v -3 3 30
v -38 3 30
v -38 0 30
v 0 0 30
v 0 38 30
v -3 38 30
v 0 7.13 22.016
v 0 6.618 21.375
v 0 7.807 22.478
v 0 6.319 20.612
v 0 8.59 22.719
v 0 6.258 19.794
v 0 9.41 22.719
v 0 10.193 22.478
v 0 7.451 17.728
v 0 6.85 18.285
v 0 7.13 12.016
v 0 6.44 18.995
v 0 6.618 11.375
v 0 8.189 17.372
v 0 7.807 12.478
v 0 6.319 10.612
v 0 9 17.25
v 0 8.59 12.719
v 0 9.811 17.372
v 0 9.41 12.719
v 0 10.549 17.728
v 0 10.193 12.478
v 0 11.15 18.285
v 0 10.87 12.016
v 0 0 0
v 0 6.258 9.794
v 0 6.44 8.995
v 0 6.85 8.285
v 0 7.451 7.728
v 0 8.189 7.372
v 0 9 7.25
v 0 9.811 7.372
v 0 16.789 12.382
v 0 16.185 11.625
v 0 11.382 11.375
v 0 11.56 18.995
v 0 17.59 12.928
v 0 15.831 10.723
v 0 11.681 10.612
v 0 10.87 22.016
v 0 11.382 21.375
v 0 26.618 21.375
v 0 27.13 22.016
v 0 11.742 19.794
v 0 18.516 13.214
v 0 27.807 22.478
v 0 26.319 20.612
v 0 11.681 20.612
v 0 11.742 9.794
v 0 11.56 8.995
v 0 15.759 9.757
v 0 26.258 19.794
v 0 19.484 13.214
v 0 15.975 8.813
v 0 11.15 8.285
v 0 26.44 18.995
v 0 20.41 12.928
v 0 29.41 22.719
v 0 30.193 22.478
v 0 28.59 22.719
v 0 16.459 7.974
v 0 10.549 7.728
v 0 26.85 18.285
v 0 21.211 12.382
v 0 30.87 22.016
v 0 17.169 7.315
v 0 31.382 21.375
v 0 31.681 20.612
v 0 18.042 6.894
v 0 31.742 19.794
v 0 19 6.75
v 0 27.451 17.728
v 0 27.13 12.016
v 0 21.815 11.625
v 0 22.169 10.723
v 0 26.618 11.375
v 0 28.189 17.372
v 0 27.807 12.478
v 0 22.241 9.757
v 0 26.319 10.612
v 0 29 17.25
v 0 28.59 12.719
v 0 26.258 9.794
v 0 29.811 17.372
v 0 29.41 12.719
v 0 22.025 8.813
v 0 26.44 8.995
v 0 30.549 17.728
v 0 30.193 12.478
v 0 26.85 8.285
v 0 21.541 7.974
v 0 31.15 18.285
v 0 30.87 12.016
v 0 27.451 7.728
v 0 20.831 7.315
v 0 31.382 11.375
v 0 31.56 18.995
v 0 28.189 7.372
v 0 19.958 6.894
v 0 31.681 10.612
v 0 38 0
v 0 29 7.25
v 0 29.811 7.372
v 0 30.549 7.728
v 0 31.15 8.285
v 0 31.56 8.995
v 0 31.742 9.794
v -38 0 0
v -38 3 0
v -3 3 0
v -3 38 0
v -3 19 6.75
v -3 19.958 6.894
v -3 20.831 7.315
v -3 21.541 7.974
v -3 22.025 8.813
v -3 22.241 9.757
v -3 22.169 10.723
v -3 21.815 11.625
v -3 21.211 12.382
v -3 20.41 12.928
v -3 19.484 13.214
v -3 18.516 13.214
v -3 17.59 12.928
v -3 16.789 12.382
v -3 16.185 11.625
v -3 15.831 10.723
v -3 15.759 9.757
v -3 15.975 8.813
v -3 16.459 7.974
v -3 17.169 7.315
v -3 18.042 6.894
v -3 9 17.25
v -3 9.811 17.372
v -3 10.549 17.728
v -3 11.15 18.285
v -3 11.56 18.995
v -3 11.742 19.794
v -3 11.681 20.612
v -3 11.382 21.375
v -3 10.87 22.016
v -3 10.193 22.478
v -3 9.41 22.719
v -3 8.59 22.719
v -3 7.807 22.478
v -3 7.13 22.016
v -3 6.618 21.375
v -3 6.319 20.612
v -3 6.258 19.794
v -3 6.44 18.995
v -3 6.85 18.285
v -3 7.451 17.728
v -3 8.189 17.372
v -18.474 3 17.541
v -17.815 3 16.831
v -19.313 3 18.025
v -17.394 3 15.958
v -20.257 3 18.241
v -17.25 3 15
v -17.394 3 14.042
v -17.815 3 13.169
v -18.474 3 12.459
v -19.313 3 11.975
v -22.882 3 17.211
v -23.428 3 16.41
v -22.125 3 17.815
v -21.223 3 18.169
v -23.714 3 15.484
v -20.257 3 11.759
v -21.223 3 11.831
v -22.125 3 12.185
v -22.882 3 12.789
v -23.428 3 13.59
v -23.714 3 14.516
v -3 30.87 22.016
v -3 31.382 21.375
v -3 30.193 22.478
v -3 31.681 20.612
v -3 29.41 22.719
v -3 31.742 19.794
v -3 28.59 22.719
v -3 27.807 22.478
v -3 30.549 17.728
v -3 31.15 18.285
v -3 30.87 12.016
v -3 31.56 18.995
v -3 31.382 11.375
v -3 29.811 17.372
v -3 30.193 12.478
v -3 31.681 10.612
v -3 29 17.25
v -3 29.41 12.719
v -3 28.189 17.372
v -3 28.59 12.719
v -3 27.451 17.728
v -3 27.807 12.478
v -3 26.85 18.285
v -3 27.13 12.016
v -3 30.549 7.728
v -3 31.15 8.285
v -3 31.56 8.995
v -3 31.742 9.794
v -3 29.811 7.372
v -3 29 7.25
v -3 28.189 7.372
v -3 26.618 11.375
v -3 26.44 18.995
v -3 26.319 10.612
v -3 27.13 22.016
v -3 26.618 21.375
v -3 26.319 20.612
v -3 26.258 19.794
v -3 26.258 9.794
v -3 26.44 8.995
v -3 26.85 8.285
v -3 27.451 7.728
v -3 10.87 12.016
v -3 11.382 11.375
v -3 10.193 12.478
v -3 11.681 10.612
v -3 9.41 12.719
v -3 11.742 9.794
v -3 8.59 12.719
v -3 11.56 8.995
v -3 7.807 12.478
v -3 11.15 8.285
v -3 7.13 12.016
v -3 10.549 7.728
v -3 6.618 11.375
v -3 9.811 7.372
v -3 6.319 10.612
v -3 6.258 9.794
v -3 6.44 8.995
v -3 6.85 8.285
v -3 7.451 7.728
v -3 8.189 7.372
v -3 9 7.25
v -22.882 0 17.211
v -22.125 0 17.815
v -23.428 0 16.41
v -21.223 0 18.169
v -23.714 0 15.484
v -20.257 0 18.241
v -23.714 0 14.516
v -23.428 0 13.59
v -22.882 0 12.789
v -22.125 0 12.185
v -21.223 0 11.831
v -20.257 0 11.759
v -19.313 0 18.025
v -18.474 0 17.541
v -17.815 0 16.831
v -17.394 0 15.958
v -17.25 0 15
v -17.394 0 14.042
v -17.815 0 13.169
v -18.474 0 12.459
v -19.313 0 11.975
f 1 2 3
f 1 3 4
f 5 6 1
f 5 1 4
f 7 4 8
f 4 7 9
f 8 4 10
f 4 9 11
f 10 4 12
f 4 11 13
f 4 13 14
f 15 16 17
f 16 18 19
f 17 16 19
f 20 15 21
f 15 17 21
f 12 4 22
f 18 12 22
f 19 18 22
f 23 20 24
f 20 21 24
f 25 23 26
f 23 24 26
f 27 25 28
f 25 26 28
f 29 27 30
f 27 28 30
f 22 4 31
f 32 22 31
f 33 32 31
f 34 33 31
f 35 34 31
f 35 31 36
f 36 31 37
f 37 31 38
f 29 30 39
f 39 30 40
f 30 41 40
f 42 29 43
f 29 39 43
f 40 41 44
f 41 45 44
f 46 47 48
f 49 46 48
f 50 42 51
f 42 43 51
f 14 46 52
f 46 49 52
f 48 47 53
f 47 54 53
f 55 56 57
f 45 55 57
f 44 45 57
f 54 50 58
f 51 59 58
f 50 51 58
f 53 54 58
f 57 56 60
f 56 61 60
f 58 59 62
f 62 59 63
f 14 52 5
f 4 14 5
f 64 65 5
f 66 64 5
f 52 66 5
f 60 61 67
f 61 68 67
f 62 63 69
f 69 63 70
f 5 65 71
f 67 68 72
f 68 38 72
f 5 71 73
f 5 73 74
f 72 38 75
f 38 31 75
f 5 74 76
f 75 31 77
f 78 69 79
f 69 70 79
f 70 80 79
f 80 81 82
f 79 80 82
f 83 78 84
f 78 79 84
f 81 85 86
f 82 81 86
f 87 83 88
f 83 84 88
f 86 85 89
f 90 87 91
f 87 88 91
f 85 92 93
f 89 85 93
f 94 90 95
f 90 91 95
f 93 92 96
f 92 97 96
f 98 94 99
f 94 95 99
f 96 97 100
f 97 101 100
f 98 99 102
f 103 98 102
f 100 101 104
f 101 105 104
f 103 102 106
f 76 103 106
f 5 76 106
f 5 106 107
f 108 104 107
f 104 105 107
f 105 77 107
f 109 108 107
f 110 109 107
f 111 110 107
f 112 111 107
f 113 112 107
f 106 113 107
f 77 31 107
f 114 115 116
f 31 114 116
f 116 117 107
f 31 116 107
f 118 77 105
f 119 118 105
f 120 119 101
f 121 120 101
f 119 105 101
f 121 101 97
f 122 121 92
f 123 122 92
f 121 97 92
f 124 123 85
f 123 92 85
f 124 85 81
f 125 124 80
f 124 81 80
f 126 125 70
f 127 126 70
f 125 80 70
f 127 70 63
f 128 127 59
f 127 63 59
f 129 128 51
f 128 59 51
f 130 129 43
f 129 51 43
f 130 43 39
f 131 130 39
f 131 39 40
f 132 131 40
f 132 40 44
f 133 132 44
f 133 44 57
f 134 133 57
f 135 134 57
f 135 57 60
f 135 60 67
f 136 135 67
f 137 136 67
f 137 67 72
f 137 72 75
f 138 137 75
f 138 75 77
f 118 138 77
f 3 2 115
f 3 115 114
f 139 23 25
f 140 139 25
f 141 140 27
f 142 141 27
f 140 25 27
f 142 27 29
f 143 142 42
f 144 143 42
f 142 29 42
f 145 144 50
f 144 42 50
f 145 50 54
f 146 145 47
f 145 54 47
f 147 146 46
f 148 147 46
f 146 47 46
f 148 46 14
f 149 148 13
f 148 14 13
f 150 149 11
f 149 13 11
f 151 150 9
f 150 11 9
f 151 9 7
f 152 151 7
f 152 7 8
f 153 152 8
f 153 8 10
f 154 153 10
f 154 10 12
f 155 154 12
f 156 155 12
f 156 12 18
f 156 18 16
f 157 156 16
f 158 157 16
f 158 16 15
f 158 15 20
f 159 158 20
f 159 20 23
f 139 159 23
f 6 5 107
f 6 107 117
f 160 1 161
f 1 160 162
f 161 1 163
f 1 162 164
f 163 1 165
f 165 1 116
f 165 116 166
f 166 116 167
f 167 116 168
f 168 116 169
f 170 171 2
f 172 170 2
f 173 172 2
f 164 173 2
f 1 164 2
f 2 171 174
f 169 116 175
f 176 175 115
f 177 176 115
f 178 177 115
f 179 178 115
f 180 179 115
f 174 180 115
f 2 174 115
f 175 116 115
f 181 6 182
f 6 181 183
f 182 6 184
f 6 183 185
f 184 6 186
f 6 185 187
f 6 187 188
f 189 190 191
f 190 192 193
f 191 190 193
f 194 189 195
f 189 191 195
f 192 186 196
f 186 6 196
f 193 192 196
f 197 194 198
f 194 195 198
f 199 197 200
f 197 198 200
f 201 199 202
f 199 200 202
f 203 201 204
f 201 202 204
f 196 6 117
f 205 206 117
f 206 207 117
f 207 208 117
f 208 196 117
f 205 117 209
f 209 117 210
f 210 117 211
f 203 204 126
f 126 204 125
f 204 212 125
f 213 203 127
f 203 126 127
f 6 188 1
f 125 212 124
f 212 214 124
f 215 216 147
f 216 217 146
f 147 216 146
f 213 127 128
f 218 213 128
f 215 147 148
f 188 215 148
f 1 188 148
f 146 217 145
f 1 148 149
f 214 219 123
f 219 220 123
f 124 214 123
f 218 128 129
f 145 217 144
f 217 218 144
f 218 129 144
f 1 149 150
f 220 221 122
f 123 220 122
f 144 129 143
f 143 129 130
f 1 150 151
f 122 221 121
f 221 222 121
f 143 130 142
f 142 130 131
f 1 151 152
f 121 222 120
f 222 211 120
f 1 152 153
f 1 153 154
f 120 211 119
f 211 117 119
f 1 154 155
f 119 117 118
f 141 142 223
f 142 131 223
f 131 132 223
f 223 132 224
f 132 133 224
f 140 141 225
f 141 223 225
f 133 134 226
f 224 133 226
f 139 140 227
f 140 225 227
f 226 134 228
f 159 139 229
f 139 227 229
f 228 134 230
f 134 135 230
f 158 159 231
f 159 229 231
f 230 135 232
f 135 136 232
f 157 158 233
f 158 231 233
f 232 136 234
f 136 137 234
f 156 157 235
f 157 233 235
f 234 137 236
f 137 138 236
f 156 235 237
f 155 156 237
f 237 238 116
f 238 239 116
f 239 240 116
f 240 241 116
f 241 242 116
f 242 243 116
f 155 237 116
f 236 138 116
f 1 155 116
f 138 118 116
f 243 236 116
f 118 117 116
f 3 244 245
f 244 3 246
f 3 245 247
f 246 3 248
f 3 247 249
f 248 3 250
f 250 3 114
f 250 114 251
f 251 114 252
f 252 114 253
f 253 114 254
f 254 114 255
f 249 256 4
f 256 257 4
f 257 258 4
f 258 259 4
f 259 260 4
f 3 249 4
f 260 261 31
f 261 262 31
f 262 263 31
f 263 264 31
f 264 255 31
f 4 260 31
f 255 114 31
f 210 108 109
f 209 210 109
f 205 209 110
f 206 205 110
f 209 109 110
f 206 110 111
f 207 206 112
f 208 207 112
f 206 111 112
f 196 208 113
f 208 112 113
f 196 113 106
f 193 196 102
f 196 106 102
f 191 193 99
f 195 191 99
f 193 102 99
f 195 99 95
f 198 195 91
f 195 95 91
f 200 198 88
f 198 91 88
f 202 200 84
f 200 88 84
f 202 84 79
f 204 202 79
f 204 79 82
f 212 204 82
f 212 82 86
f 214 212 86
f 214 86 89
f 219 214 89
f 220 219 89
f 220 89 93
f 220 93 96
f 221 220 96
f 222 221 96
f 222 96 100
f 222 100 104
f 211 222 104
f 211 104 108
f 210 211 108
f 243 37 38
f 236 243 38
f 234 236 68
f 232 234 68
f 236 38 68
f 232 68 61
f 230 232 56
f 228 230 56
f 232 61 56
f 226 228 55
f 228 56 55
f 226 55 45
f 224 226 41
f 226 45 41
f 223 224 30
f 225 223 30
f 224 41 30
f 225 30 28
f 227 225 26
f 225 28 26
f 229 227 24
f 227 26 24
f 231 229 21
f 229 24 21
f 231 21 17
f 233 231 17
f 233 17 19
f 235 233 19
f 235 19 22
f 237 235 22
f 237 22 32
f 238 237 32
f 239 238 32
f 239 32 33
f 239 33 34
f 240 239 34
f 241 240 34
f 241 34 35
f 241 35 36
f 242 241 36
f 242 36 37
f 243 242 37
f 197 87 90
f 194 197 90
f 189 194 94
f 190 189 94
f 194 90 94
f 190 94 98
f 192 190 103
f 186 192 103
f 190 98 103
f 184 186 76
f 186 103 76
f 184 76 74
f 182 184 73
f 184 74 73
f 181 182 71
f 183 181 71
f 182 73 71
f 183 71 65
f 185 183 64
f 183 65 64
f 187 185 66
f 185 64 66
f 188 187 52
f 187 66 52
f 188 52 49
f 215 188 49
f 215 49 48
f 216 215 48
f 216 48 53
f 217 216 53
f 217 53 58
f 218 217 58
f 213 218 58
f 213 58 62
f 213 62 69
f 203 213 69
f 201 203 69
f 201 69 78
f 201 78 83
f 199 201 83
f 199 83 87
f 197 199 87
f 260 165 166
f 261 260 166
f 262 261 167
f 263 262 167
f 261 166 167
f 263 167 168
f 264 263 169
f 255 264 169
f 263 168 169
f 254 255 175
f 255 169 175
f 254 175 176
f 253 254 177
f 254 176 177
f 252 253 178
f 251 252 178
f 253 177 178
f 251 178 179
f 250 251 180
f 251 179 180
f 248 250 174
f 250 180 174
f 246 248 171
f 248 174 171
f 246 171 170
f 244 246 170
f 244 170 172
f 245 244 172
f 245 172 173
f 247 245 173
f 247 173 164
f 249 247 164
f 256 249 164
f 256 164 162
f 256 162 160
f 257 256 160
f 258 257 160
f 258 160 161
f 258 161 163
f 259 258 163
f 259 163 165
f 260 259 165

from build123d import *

# Parameters (mm, degrees)
EXTRUDE_1_DEPTH     = 30
CUT_EXTRUDE_3_REACH = 40
SKETCH_4_R          = 2.75
SKETCH_4_R_2        = 3.25
CUT_EXTRUDE_4_REACH = 5
SKETCH_5_R          = 3.25


with BuildPart() as part:
    # 草图1 → 凸台-拉伸1 (new body)
    with BuildSketch(Plane.XY):
        Polygon((0, 0), (0, 38), (-3, 38), (-3, 3), (-38, 3), (-38, 0), align=None)
    extrude(amount=EXTRUDE_1_DEPTH)

    # 草图4 → 切除-拉伸3 (cut, up to next)
    with BuildSketch(Plane(origin=(0, 0, 0), x_dir=(0, 0, -1), z_dir=(1, 0, 0)), mode=Mode.PRIVATE) as cut_extrude_3_sk1:
        with Locations((-10, 29)):
            Circle(SKETCH_4_R)
    cut_extrude_3_tool1 = extrude(cut_extrude_3_sk1.sketch, amount=-CUT_EXTRUDE_3_REACH, mode=Mode.PRIVATE) & part.part
    add(cut_extrude_3_tool1.solids().sort_by_distance((0, 29, 10))[0], mode=Mode.SUBTRACT)
    # 草图4 → 切除-拉伸3 (cut, up to next)
    with BuildSketch(Plane(origin=(0, 0, 0), x_dir=(0, 0, -1), z_dir=(1, 0, 0)), mode=Mode.PRIVATE) as cut_extrude_3_sk2:
        with Locations((-10, 19)):
            Circle(SKETCH_4_R_2)
    cut_extrude_3_tool2 = extrude(cut_extrude_3_sk2.sketch, amount=-CUT_EXTRUDE_3_REACH, mode=Mode.PRIVATE) & part.part
    add(cut_extrude_3_tool2.solids().sort_by_distance((0, 19, 10))[0], mode=Mode.SUBTRACT)
    # 草图4 → 切除-拉伸3 (cut, up to next)
    with BuildSketch(Plane(origin=(0, 0, 0), x_dir=(0, 0, -1), z_dir=(1, 0, 0)), mode=Mode.PRIVATE) as cut_extrude_3_sk3:
        with Locations((-10, 9)):
            Circle(SKETCH_4_R)
    cut_extrude_3_tool3 = extrude(cut_extrude_3_sk3.sketch, amount=-CUT_EXTRUDE_3_REACH, mode=Mode.PRIVATE) & part.part
    add(cut_extrude_3_tool3.solids().sort_by_distance((0, 9, 10))[0], mode=Mode.SUBTRACT)
    # 草图4 → 切除-拉伸3 (cut, up to next)
    with BuildSketch(Plane(origin=(0, 0, 0), x_dir=(0, 0, -1), z_dir=(1, 0, 0)), mode=Mode.PRIVATE) as cut_extrude_3_sk4:
        with Locations((-20, 29)):
            Circle(SKETCH_4_R)
    cut_extrude_3_tool4 = extrude(cut_extrude_3_sk4.sketch, amount=-CUT_EXTRUDE_3_REACH, mode=Mode.PRIVATE) & part.part
    add(cut_extrude_3_tool4.solids().sort_by_distance((0, 29, 20))[0], mode=Mode.SUBTRACT)
    # 草图4 → 切除-拉伸3 (cut, up to next)
    with BuildSketch(Plane(origin=(0, 0, 0), x_dir=(0, 0, -1), z_dir=(1, 0, 0)), mode=Mode.PRIVATE) as cut_extrude_3_sk5:
        with Locations((-20, 9)):
            Circle(SKETCH_4_R)
    cut_extrude_3_tool5 = extrude(cut_extrude_3_sk5.sketch, amount=-CUT_EXTRUDE_3_REACH, mode=Mode.PRIVATE) & part.part
    add(cut_extrude_3_tool5.solids().sort_by_distance((0, 9, 20))[0], mode=Mode.SUBTRACT)

    # 草图5 → 切除-拉伸4 (cut, up to next)
    with BuildSketch(Plane(origin=(0, 3, 0), x_dir=(1, 0, 0), z_dir=(0, 1, 0)), mode=Mode.PRIVATE) as cut_extrude_4_sk1:
        with Locations((-20.5, -15)):
            Circle(SKETCH_5_R)
    cut_extrude_4_tool1 = extrude(cut_extrude_4_sk1.sketch, amount=-CUT_EXTRUDE_4_REACH, mode=Mode.PRIVATE) & part.part
    add(cut_extrude_4_tool1.solids().sort_by_distance((-20.5, 3, 15))[0], mode=Mode.SUBTRACT)


solid = part.part
